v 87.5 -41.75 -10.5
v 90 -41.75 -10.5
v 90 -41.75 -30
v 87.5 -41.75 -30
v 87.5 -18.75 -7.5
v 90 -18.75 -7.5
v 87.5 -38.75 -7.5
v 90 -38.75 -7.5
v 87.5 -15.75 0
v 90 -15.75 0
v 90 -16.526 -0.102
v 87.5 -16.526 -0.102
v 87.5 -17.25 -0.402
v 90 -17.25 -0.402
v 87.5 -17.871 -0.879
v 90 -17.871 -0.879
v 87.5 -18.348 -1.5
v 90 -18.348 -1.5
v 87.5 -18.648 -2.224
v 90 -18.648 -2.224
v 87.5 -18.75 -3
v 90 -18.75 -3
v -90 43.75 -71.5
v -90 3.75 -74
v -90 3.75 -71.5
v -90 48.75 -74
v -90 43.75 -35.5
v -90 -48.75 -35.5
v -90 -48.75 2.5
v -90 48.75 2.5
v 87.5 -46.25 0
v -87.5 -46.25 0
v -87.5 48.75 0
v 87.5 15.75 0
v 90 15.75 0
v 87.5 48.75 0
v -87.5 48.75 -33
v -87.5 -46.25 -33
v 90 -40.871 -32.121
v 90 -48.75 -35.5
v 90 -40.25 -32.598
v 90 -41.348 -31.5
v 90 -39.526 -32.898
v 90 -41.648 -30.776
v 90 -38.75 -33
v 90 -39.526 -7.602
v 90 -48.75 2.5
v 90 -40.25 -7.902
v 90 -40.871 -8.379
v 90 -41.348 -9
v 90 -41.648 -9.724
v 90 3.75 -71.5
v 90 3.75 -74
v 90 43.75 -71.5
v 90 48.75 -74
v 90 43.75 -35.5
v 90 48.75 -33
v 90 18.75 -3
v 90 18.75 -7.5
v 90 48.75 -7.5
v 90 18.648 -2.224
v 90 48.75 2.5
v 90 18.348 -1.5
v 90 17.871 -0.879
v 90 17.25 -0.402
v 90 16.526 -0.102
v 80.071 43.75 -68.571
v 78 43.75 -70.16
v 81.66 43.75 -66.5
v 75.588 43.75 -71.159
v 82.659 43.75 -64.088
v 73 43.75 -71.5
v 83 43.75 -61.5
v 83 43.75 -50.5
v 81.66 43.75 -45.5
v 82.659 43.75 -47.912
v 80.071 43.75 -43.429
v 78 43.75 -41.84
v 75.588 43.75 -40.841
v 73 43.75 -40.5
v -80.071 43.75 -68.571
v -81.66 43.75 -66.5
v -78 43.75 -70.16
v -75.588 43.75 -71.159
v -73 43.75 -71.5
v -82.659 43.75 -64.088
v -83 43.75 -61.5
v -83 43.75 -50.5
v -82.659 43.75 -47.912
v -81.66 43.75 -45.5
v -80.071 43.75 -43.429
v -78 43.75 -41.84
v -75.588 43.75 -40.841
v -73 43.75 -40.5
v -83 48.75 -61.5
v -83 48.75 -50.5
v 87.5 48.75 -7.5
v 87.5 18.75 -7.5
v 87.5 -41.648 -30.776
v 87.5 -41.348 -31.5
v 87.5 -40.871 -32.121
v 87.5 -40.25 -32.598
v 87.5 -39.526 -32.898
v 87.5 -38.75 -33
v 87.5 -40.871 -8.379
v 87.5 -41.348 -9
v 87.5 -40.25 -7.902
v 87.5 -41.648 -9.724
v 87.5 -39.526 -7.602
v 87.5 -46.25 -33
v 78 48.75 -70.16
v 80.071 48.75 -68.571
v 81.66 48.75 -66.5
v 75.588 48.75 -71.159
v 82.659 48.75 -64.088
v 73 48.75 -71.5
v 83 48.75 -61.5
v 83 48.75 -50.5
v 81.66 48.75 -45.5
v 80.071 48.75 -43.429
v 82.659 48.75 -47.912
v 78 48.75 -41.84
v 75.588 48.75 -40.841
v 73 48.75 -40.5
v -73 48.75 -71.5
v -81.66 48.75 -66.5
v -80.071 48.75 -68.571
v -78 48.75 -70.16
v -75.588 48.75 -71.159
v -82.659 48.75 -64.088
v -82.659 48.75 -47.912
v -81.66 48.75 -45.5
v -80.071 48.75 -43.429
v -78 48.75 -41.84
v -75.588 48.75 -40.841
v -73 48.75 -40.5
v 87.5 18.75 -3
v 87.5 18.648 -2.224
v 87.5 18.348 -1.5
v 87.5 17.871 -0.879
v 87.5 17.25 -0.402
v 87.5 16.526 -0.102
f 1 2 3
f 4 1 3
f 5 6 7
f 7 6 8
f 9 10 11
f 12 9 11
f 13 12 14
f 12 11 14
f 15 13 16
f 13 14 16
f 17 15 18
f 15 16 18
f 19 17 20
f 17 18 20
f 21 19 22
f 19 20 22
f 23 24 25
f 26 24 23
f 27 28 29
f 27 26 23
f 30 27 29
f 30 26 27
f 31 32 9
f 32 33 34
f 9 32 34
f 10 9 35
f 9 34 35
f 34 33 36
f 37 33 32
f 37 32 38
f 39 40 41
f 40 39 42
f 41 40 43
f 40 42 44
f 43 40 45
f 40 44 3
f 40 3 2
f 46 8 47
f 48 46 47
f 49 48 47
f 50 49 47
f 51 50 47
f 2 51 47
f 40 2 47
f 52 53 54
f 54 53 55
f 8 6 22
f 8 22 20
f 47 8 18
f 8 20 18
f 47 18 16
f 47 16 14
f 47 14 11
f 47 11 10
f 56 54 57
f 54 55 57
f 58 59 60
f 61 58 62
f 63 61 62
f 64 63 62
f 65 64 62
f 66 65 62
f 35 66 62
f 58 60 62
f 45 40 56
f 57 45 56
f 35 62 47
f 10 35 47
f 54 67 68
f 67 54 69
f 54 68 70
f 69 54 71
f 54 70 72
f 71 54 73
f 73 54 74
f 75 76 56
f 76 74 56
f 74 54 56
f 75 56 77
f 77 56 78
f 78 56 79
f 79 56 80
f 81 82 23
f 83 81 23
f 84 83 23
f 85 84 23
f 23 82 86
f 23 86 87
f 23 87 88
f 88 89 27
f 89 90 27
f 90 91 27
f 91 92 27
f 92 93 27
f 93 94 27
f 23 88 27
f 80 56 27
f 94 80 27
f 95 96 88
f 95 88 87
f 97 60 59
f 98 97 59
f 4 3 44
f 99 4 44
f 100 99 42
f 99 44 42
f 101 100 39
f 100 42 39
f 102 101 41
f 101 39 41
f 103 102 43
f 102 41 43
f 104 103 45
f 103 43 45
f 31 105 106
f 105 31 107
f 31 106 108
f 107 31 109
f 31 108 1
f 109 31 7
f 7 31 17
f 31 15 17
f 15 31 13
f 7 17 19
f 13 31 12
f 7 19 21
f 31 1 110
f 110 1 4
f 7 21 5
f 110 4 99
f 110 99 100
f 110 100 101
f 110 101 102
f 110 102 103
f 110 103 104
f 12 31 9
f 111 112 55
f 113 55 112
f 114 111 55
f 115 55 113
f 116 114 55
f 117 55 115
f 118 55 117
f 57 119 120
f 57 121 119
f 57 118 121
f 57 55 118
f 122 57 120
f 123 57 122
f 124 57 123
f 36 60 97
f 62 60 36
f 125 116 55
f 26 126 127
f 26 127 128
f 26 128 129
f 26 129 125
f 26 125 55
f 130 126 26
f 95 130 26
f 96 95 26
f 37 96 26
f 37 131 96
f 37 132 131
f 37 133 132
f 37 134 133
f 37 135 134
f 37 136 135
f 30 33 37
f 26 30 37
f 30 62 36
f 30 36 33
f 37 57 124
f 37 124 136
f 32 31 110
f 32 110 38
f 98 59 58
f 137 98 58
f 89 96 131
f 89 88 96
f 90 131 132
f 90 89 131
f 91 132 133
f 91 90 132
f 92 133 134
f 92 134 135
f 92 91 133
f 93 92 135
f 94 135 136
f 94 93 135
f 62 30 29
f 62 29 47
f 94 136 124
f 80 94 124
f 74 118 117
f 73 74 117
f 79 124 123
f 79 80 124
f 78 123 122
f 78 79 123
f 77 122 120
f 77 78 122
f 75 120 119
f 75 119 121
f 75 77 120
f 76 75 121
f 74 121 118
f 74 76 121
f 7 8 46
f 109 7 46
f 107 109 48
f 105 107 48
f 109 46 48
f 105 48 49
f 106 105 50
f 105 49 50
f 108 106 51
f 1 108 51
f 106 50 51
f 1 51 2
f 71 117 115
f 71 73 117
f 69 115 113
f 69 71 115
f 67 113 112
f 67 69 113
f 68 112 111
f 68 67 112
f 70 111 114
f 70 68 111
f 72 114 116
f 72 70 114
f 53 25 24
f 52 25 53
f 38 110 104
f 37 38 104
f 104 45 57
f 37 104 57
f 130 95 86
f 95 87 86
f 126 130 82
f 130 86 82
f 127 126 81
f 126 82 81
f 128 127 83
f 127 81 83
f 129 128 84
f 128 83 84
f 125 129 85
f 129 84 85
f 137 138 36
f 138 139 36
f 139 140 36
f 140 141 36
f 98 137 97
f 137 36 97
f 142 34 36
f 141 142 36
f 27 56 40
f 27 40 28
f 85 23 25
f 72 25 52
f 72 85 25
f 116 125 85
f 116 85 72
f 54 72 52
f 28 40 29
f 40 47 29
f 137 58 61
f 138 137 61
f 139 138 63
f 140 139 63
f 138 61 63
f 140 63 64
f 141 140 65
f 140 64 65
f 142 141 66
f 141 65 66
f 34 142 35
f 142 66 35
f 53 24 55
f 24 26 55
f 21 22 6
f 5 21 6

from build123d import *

# Parameters (mm, degrees)
SKETCH1_W           = 180
SKETCH1_H           = 97.5
BOSS_EXTRUDE1_DEPTH = 2.5
SKETCH2_W           = 180
SKETCH2_H           = 97.5
SKETCH2_W_2         = 175
SKETCH2_H_2         = 92.5
BOSS_EXTRUDE2_DEPTH = 33
SKETCH3_W           = 180
SKETCH3_H           = 97.5
BOSS_EXTRUDE3_DEPTH = 2.5
SKETCH4_W           = 180
SKETCH4_H           = 5
BOSS_EXTRUDE4_DEPTH = 38.5
SKETCH5_W           = 180
SKETCH5_H           = 2.5
BOSS_EXTRUDE5_DEPTH = 40
SKETCH7_W           = 175
SKETCH7_H           = 33
CUT_EXTRUDE2_DEPTH  = 2.5
CUT_EXTRUDE3_DEPTH  = 2.5
SKETCH12_W          = 166
SKETCH12_H          = 31
CUT_EXTRUDE5_DEPTH  = 5
FILLET1_R           = 10
FILLET2_R           = 10
FILLET3_R           = 10
FILLET4_R           = 10


with BuildPart() as part:
    # Sketch1 → Boss-Extrude1 (new body)
    with BuildSketch(Plane.XY):
        Rectangle(SKETCH1_W, SKETCH1_H)
    extrude(amount=BOSS_EXTRUDE1_DEPTH)

    # Sketch2 → Boss-Extrude2 (add)
    with BuildSketch(Plane(origin=(0, 0, 0), x_dir=(-1, 0, 0), z_dir=(0, 0, -1))):
        Rectangle(SKETCH2_W, SKETCH2_H)
        Rectangle(SKETCH2_W_2, SKETCH2_H_2, mode=Mode.SUBTRACT)
    extrude(amount=BOSS_EXTRUDE2_DEPTH)

    # Sketch3 → Boss-Extrude3 (add)
    with BuildSketch(Plane(origin=(0, 0, -33), x_dir=(-1, 0, 0), z_dir=(0, 0, -1))):
        Rectangle(SKETCH3_W, SKETCH3_H)
    extrude(amount=BOSS_EXTRUDE3_DEPTH)

    # Sketch4 → Boss-Extrude4 (add)
    with BuildSketch(Plane(origin=(0, 0, -35.5), x_dir=(-1, 0, 0), z_dir=(0, 0, -1))):
        with Locations((0, 46.25)):
            Rectangle(SKETCH4_W, SKETCH4_H)
    extrude(amount=BOSS_EXTRUDE4_DEPTH)

    # Sketch5 → Boss-Extrude5 (add)
    with BuildSketch(Plane.XZ.offset(-43.75)):
        with Locations((0, -72.75)):
            Rectangle(SKETCH5_W, SKETCH5_H)
    extrude(amount=BOSS_EXTRUDE5_DEPTH)

    # Sketch7 → Cut-Extrude2 (cut)
    with BuildSketch(Plane(origin=(0, 48.75, 0), x_dir=(1, 0, 0), z_dir=(0, 1, 0))):
        with Locations((0, 16.5)):
            Rectangle(SKETCH7_W, SKETCH7_H)
    extrude(amount=-CUT_EXTRUDE2_DEPTH, mode=Mode.SUBTRACT)

    # Sketch9 → Cut-Extrude3 (cut)
    with BuildSketch(Plane(origin=(90, 0, 0), x_dir=(0, 0, -1), z_dir=(1, 0, 0))):
        with BuildLine():
            Line((33, 48.75), (7.5, 48.75))
            Line((7.5, 48.75), (7.5, 18.75))
            Line((7.5, 18.75), (3, 18.75))
            ThreePointArc((3, 18.75), (0.878679656, 17.871320344), (0, 15.75))
            Line((0, 15.75), (0, -15.75))
            ThreePointArc((0, -15.75), (0.878679656, -17.871320344), (3, -18.75))
            Line((3, -18.75), (7.5, -18.75))
            Line((7.5, -18.75), (7.5, -38.75))
            ThreePointArc((7.5, -38.75), (8.378679656, -40.871320344), (10.5, -41.75))
            Line((10.5, -41.75), (30, -41.75))
            ThreePointArc((30, -41.75), (32.121320344, -40.871320344), (33, -38.75))
            Line((33, -38.75), (33, 48.75))
        make_face()
    extrude(amount=-CUT_EXTRUDE3_DEPTH, mode=Mode.SUBTRACT)

    # Sketch12 → Cut-Extrude5 (cut)
    with BuildSketch(Plane(origin=(0, 48.75, 0), x_dir=(1, 0, 0), z_dir=(0, 1, 0))):
        with Locations((0, 56)):
            Rectangle(SKETCH12_W, SKETCH12_H)
    extrude(amount=-CUT_EXTRUDE5_DEPTH, mode=Mode.SUBTRACT)

    # Fillet1
    fillet1_edges = [part.edges().sort_by_distance(p)[0] for p in [
        (83, 46.25, -40.5),
    ]]
    fillet(fillet1_edges, radius=FILLET1_R)

    # Fillet2
    fillet2_edges = [part.edges().sort_by_distance(p)[0] for p in [
        (83, 46.25, -71.5),
    ]]
    fillet(fillet2_edges, radius=FILLET2_R)

    # Fillet3
    fillet3_edges = [part.edges().sort_by_distance(p)[0] for p in [
        (-83, 46.25, -40.5),
    ]]
    fillet(fillet3_edges, radius=FILLET3_R)

    # Fillet4
    fillet4_edges = [part.edges().sort_by_distance(p)[0] for p in [
        (-83, 46.25, -71.5),
    ]]
    fillet(fillet4_edges, radius=FILLET4_R)


solid = part.part
